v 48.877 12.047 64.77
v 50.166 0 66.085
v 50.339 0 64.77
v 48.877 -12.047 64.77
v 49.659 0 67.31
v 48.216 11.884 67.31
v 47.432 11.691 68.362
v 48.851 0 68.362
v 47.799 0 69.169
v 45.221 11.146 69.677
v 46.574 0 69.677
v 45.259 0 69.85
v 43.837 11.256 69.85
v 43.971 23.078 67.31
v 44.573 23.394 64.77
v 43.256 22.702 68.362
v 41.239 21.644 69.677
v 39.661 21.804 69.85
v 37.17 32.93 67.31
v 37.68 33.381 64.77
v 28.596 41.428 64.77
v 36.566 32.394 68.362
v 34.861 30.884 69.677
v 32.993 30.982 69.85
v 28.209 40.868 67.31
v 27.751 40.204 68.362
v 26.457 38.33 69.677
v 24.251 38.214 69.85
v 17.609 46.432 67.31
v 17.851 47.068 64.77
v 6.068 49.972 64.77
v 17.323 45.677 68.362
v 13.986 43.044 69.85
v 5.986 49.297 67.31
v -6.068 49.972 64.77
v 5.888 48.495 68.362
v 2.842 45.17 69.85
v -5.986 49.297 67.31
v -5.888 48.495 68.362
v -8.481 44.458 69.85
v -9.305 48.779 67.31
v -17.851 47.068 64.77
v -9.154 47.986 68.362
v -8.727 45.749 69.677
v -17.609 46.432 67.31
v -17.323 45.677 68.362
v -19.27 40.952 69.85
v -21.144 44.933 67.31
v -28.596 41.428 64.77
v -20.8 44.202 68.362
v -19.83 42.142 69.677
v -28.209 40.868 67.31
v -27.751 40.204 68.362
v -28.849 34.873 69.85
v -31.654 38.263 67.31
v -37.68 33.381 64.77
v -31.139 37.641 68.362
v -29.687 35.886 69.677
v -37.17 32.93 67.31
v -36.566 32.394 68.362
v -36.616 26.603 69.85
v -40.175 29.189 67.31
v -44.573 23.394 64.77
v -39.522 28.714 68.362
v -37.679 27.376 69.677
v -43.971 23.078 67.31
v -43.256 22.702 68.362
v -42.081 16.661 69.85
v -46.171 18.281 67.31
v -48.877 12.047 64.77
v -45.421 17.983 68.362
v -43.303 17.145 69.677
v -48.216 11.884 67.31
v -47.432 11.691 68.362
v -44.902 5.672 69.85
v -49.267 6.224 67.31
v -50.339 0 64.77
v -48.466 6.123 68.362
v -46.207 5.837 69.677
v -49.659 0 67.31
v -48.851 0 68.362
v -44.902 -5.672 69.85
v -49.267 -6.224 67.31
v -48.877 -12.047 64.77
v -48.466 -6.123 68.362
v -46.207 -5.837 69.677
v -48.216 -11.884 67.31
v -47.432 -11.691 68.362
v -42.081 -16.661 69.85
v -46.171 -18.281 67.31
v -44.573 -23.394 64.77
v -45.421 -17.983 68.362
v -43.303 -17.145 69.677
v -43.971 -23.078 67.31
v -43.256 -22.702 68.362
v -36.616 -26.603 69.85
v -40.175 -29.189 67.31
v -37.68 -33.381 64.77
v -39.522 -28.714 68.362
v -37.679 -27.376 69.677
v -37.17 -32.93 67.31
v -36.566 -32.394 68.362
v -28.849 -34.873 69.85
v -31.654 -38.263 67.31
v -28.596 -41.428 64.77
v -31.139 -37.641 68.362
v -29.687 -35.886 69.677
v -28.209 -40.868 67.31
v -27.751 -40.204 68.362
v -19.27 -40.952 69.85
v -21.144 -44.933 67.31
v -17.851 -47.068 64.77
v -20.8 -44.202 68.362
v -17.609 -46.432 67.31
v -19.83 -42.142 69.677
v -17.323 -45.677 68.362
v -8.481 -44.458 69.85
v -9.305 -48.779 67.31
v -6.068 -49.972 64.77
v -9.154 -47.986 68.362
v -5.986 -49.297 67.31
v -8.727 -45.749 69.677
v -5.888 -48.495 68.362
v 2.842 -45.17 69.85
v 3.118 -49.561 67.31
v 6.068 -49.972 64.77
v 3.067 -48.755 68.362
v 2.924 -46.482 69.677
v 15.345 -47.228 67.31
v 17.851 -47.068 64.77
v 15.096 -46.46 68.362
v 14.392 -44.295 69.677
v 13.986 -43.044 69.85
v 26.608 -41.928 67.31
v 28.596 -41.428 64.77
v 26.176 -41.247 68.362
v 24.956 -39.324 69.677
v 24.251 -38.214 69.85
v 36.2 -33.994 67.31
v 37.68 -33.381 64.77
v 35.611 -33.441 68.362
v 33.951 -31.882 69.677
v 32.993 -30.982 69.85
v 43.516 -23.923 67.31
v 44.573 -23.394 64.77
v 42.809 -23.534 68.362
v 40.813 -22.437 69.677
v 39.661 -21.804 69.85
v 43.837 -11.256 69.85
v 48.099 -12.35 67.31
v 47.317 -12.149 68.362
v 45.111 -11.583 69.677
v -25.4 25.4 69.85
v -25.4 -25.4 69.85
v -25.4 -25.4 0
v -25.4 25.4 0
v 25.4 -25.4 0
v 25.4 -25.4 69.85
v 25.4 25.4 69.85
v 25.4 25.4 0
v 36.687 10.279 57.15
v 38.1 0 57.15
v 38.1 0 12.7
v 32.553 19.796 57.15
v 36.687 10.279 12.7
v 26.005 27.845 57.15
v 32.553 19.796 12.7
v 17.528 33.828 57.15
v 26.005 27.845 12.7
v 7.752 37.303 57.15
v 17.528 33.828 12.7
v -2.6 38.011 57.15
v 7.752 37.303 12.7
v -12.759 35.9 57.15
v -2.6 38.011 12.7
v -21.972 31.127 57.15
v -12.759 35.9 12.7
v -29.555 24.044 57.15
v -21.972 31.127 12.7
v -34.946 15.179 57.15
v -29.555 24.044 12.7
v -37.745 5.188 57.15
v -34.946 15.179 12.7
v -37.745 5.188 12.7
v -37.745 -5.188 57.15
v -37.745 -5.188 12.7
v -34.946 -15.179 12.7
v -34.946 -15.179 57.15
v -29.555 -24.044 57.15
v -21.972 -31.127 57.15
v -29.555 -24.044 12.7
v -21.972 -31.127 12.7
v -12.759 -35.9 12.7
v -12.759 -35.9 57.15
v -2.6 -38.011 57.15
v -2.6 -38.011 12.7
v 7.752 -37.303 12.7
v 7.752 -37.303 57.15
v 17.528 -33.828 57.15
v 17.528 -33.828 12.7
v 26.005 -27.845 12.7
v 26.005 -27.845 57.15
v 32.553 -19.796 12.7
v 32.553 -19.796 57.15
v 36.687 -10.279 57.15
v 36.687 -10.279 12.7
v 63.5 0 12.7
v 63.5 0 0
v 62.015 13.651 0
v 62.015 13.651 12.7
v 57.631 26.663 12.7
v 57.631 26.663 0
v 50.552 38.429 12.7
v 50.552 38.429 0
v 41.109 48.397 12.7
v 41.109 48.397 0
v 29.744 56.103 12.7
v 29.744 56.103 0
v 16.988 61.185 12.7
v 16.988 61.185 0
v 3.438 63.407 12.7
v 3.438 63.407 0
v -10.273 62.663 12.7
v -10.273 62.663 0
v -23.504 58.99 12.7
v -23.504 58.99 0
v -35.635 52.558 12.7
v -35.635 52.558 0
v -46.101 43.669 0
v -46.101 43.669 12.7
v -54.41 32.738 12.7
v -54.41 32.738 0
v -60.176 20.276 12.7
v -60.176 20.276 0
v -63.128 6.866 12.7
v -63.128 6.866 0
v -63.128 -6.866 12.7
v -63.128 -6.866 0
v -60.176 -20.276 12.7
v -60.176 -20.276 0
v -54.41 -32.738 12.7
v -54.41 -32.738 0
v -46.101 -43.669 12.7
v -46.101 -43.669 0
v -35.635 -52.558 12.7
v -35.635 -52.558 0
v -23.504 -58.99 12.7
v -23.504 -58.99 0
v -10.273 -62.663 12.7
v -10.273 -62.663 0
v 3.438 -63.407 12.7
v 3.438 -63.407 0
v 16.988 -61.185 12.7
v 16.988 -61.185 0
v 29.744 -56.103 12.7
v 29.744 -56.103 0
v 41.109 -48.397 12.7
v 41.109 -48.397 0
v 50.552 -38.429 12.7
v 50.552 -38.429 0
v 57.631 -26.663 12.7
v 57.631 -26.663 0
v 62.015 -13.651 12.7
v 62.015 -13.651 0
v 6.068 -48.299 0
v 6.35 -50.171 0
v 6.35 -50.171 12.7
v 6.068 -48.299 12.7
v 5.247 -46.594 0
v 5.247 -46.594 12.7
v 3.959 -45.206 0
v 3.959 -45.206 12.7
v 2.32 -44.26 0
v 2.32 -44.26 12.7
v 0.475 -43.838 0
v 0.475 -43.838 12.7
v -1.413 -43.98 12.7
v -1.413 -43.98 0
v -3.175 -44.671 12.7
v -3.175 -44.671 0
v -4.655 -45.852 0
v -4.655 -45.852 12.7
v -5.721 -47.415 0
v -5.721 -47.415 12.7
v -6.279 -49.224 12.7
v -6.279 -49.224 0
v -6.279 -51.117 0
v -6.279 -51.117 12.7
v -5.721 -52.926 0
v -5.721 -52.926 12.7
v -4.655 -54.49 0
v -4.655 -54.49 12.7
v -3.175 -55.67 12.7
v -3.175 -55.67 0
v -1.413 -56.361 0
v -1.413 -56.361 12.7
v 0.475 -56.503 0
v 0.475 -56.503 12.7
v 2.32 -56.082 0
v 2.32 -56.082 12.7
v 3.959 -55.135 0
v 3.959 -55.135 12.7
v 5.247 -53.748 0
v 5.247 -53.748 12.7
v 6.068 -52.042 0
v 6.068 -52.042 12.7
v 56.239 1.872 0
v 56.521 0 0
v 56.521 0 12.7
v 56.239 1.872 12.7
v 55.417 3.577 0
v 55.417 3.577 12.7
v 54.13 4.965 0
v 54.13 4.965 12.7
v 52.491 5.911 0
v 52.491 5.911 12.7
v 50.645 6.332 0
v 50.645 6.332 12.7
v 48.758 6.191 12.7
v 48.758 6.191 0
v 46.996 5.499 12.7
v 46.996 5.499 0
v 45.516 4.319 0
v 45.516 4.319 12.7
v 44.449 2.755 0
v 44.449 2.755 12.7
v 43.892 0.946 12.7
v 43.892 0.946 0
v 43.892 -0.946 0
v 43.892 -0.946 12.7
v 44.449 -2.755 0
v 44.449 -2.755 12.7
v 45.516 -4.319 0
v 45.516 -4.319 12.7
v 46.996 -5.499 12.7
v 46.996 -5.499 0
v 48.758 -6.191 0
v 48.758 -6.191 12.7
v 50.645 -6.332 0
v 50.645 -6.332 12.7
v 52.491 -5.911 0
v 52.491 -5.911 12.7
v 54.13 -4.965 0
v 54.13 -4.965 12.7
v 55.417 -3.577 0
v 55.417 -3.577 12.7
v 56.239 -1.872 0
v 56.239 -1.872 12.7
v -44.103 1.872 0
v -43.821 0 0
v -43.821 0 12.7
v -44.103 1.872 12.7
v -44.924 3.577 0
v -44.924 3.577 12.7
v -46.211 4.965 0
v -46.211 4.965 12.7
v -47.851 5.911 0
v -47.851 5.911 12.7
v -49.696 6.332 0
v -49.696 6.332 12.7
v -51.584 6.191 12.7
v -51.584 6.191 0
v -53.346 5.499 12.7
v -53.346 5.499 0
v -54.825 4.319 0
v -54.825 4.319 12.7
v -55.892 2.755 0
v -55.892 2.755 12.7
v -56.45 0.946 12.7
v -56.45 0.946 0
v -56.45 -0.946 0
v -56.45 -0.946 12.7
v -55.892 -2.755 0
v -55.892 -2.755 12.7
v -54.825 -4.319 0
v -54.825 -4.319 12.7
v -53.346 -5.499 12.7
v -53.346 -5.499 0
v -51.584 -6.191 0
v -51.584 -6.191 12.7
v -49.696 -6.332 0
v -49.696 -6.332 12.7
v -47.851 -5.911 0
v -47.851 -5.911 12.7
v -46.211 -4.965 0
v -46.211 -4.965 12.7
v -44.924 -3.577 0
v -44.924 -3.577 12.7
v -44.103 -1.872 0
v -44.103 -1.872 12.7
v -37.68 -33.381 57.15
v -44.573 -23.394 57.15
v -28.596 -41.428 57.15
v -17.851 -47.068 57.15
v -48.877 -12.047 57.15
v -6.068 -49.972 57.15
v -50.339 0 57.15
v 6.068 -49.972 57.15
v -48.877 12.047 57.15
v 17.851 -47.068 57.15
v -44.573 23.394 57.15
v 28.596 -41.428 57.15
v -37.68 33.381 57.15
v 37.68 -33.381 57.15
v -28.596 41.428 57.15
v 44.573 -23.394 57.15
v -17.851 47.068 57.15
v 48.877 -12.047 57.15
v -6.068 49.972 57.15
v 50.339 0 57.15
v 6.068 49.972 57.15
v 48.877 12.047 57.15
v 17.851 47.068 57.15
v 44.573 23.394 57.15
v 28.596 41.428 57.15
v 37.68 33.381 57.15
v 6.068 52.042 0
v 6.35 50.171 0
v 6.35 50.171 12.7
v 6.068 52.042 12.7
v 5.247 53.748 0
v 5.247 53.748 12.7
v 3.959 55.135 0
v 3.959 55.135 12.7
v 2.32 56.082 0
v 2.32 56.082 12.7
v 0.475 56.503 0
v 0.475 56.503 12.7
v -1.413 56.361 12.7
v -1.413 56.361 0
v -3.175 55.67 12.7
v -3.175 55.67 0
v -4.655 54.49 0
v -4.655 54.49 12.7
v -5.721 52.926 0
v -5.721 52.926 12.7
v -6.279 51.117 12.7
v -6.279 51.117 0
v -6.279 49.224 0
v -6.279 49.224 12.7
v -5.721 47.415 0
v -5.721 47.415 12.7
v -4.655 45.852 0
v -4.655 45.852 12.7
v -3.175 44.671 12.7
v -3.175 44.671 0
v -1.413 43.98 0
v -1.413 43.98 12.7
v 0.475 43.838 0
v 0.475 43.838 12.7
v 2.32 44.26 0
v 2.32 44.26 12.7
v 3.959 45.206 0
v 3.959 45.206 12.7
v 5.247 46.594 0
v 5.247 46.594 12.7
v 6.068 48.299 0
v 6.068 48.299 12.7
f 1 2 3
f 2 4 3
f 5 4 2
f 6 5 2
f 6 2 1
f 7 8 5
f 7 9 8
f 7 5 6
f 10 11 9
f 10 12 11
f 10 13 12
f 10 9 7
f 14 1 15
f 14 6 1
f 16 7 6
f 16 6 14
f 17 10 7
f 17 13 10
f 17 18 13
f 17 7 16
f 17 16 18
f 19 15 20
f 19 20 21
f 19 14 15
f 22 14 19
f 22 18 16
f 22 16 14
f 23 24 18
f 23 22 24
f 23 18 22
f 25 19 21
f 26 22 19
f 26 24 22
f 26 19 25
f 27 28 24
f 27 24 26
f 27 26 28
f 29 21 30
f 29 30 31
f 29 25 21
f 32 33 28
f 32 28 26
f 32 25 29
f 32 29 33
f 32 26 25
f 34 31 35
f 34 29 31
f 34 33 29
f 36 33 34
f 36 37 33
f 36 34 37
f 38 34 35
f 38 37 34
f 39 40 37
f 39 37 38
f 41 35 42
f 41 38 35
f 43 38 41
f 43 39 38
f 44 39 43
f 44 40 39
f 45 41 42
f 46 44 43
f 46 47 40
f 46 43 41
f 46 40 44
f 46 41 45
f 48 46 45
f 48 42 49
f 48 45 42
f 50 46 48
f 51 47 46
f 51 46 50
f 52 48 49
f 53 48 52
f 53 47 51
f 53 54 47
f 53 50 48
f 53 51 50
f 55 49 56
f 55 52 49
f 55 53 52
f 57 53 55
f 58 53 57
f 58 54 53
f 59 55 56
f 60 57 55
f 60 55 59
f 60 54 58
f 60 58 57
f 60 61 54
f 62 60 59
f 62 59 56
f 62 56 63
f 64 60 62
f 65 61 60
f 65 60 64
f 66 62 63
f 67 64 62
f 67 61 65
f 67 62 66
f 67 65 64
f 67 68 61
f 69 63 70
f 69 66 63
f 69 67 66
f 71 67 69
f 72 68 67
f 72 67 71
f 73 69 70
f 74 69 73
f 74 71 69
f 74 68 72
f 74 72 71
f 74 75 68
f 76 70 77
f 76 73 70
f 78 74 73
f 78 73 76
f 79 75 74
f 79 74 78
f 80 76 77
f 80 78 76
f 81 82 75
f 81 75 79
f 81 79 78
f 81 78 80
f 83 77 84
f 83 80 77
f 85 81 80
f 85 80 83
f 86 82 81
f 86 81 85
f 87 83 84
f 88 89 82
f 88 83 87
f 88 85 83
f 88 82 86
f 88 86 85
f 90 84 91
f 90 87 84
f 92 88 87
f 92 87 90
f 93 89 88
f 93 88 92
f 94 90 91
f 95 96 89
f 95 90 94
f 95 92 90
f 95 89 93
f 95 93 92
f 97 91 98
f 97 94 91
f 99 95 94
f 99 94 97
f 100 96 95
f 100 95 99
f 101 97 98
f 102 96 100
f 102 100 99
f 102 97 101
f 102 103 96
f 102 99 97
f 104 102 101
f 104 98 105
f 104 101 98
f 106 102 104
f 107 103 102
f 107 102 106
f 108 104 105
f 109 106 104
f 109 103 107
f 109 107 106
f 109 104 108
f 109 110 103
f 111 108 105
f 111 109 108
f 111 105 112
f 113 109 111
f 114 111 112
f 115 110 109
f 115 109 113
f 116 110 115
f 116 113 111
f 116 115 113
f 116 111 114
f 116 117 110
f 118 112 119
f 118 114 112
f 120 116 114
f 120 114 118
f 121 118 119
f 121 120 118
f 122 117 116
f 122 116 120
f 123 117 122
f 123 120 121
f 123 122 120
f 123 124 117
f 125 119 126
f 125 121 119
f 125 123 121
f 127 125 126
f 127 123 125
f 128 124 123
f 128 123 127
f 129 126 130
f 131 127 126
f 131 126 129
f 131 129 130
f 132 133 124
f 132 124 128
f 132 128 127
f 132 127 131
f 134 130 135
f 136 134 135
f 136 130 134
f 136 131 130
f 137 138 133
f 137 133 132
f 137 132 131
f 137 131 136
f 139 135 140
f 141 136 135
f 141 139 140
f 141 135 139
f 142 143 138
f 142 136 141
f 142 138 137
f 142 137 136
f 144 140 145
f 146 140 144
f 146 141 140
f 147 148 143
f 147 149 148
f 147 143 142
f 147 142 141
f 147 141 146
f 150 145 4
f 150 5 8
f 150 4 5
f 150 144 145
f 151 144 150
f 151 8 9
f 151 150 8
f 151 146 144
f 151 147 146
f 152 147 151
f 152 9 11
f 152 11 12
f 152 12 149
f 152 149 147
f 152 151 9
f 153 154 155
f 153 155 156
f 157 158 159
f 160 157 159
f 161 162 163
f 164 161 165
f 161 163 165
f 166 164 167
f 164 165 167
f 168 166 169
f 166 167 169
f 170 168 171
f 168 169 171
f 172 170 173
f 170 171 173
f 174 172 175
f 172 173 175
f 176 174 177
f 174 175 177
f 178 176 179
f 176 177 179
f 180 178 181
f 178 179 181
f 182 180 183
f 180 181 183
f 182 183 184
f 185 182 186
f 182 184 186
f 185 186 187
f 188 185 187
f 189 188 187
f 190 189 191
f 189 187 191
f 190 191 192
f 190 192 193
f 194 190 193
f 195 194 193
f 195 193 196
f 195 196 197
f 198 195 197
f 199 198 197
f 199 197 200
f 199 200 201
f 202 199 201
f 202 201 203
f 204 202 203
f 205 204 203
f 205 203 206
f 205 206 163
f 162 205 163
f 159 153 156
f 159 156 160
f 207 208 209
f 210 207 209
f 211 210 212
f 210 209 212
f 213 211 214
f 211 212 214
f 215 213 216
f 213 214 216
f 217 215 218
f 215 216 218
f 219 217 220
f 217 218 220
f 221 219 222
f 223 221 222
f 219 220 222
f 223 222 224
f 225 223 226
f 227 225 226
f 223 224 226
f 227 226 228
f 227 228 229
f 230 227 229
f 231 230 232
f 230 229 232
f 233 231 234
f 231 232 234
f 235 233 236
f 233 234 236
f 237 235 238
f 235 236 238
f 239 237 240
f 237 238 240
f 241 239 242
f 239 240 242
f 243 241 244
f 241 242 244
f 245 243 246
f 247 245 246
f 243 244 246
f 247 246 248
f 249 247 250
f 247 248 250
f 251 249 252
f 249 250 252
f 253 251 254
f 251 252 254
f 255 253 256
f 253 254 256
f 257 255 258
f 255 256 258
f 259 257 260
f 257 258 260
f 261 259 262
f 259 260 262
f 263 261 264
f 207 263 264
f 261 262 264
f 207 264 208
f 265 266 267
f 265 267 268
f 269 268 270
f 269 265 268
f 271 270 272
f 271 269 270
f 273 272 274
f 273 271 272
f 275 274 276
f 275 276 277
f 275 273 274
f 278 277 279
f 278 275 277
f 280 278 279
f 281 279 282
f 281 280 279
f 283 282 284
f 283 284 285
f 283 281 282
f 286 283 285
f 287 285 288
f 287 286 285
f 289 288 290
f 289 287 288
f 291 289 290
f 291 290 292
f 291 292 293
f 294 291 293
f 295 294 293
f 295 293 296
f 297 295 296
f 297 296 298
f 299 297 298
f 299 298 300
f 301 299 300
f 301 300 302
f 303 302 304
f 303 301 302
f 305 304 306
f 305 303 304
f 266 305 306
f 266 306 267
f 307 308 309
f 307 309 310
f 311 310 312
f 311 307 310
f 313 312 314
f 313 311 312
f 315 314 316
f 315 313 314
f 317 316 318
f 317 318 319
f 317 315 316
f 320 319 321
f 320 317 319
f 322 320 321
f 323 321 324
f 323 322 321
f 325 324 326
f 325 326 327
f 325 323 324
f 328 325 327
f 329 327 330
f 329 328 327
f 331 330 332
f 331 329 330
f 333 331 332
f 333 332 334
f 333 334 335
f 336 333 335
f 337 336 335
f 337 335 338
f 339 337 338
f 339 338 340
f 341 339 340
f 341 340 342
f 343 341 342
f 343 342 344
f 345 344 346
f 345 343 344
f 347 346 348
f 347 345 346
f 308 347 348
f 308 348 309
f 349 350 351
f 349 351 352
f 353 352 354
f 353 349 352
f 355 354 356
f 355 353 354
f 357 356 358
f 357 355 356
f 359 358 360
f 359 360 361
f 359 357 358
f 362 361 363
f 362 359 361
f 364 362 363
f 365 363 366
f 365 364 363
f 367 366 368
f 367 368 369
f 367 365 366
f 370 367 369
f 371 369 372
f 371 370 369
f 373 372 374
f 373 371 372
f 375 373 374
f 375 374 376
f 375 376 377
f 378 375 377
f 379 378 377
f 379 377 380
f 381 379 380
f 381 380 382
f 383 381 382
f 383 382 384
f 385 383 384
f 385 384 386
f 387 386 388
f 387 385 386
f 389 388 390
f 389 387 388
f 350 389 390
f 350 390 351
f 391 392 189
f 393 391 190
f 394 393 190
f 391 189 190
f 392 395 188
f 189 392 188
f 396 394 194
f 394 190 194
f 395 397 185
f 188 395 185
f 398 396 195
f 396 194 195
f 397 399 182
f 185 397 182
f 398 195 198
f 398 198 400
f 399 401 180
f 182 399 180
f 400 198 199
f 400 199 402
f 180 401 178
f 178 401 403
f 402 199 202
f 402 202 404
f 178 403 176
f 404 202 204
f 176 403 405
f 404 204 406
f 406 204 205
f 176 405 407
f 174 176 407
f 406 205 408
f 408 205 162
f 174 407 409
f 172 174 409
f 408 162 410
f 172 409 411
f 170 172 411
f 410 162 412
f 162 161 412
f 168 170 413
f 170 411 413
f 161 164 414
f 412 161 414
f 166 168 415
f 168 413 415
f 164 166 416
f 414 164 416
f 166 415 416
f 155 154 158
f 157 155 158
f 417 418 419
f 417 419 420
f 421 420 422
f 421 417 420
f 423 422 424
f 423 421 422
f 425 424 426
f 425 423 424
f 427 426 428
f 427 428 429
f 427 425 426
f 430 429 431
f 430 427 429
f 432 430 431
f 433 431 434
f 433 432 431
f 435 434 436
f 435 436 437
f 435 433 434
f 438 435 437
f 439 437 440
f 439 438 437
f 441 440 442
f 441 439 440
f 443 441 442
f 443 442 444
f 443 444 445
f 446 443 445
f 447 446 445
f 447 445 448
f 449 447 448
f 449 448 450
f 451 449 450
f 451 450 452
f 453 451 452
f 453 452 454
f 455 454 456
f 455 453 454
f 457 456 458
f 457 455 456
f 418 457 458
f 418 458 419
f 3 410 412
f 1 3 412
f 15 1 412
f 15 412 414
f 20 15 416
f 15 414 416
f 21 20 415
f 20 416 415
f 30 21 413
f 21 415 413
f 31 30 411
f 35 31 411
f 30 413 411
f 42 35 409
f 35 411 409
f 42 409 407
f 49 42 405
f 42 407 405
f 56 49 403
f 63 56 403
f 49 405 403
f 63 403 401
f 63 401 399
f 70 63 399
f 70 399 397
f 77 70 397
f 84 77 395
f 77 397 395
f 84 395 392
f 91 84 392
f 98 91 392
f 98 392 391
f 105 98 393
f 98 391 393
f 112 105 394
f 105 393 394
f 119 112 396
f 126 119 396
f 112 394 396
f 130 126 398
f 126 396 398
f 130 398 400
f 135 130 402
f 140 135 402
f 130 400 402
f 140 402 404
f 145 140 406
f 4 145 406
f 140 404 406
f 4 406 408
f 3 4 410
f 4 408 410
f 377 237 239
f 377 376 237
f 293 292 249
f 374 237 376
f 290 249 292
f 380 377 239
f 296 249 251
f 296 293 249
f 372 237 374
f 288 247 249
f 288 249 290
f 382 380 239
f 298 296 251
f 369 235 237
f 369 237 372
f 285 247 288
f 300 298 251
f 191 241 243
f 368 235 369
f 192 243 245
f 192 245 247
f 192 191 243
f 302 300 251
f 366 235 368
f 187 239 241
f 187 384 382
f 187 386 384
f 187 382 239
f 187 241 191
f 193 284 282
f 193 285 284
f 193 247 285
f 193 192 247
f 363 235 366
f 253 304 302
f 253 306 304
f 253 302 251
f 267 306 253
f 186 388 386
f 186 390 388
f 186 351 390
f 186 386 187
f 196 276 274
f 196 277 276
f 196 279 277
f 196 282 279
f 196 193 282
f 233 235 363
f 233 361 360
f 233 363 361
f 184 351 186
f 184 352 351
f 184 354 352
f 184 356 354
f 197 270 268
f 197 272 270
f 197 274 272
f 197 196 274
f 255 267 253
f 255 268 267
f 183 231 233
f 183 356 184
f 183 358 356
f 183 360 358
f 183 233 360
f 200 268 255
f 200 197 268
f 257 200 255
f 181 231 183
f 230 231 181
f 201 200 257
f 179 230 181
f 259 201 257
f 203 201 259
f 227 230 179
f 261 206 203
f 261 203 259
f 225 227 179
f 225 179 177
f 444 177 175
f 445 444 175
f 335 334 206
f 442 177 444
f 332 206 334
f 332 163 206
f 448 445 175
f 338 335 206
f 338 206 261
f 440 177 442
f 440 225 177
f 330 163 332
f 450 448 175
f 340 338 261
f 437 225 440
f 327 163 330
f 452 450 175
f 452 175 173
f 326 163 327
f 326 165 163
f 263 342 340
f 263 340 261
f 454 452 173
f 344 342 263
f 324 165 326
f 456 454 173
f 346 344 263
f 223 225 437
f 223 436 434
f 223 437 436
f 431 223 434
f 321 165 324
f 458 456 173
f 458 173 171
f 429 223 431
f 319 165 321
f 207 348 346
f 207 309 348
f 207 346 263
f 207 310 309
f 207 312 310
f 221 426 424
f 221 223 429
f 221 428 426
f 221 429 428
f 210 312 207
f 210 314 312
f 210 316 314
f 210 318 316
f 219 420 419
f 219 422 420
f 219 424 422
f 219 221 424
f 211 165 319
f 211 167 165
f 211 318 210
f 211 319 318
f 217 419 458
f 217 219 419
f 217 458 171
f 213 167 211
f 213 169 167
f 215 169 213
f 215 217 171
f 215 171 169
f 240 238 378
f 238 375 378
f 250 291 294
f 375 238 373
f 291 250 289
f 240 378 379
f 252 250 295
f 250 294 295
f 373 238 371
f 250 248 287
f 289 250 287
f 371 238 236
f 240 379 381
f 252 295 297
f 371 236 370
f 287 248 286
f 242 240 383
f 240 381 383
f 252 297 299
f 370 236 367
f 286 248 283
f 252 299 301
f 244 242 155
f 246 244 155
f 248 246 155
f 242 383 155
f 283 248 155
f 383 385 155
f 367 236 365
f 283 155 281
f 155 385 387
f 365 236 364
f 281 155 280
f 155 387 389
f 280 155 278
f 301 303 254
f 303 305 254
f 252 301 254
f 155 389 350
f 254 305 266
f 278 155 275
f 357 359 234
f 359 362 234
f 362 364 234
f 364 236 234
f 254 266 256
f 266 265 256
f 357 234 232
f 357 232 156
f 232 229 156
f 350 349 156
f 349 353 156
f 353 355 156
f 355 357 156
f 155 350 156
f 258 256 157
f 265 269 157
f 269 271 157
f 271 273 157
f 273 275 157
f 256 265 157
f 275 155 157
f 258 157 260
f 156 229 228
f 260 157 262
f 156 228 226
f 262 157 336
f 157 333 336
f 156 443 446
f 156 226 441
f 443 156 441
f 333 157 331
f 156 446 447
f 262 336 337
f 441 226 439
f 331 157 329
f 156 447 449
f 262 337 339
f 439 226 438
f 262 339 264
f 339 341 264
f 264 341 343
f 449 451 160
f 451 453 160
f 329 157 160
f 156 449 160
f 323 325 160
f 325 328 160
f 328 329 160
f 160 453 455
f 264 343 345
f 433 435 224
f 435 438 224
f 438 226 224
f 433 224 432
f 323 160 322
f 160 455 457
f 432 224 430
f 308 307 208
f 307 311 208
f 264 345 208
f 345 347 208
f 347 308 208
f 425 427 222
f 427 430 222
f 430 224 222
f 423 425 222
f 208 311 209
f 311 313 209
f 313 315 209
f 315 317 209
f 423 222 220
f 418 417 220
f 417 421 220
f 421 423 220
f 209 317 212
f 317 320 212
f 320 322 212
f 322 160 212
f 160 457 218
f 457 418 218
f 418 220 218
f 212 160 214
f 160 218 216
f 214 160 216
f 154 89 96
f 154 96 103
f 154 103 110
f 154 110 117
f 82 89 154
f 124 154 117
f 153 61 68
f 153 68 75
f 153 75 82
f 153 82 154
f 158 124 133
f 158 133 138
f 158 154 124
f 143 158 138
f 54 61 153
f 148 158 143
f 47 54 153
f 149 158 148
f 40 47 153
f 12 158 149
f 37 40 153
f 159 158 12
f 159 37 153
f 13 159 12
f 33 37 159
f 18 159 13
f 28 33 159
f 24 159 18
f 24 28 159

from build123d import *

# Parameters (mm, degrees)
F0_R      = 63.5
F1_DEPTH  = 12.7
F2_R      = 38.1
F3_DEPTH  = 57.15
F4_R      = 50.339294
F5_DEPTH  = 12.7
F6_R      = 5.08
F7_R      = 6.35
F8_DEPTH  = 12.7
F9_W      = 50.8
F9_H      = 50.8
F10_DEPTH = 127


with BuildPart() as f1:
    # F0 (on Top) → F1 (new body)
    with BuildSketch(Plane.XY):
        Circle(F0_R)
    extrude(amount=F1_DEPTH)

    # F2 (on Top) → F3 (join)
    with BuildSketch(Plane.XY):
        Circle(F2_R)
    extrude(amount=F3_DEPTH)

    # F4 (on face) → F5 (join)
    with BuildSketch(Plane.XY.offset(57.15)):
        Circle(F4_R)
    extrude(amount=F5_DEPTH)

    # F6
    f6_edges = [f1.edges().sort_by_distance(p)[0] for p in [
        (-50.339294, 0, 69.85),
    ]]
    fillet(f6_edges, radius=F6_R)

    # F7 (on Top) → F8 (cut)
    with BuildSketch(Plane.XY):
        with Locations((0, 50.170619)):
            Circle(F7_R)
        with Locations((-50.170619, 0)):
            Circle(F7_R)
        with Locations((0, -50.170619)):
            Circle(F7_R)
        with Locations((50.170619, 0)):
            Circle(F7_R)
    extrude(amount=F8_DEPTH, mode=Mode.SUBTRACT)

    # F9 (on Top) → F10 (cut)
    with BuildSketch(Plane.XY):
        Rectangle(F9_W, F9_H)
    extrude(amount=F10_DEPTH, mode=Mode.SUBTRACT)


solid = f1.part
